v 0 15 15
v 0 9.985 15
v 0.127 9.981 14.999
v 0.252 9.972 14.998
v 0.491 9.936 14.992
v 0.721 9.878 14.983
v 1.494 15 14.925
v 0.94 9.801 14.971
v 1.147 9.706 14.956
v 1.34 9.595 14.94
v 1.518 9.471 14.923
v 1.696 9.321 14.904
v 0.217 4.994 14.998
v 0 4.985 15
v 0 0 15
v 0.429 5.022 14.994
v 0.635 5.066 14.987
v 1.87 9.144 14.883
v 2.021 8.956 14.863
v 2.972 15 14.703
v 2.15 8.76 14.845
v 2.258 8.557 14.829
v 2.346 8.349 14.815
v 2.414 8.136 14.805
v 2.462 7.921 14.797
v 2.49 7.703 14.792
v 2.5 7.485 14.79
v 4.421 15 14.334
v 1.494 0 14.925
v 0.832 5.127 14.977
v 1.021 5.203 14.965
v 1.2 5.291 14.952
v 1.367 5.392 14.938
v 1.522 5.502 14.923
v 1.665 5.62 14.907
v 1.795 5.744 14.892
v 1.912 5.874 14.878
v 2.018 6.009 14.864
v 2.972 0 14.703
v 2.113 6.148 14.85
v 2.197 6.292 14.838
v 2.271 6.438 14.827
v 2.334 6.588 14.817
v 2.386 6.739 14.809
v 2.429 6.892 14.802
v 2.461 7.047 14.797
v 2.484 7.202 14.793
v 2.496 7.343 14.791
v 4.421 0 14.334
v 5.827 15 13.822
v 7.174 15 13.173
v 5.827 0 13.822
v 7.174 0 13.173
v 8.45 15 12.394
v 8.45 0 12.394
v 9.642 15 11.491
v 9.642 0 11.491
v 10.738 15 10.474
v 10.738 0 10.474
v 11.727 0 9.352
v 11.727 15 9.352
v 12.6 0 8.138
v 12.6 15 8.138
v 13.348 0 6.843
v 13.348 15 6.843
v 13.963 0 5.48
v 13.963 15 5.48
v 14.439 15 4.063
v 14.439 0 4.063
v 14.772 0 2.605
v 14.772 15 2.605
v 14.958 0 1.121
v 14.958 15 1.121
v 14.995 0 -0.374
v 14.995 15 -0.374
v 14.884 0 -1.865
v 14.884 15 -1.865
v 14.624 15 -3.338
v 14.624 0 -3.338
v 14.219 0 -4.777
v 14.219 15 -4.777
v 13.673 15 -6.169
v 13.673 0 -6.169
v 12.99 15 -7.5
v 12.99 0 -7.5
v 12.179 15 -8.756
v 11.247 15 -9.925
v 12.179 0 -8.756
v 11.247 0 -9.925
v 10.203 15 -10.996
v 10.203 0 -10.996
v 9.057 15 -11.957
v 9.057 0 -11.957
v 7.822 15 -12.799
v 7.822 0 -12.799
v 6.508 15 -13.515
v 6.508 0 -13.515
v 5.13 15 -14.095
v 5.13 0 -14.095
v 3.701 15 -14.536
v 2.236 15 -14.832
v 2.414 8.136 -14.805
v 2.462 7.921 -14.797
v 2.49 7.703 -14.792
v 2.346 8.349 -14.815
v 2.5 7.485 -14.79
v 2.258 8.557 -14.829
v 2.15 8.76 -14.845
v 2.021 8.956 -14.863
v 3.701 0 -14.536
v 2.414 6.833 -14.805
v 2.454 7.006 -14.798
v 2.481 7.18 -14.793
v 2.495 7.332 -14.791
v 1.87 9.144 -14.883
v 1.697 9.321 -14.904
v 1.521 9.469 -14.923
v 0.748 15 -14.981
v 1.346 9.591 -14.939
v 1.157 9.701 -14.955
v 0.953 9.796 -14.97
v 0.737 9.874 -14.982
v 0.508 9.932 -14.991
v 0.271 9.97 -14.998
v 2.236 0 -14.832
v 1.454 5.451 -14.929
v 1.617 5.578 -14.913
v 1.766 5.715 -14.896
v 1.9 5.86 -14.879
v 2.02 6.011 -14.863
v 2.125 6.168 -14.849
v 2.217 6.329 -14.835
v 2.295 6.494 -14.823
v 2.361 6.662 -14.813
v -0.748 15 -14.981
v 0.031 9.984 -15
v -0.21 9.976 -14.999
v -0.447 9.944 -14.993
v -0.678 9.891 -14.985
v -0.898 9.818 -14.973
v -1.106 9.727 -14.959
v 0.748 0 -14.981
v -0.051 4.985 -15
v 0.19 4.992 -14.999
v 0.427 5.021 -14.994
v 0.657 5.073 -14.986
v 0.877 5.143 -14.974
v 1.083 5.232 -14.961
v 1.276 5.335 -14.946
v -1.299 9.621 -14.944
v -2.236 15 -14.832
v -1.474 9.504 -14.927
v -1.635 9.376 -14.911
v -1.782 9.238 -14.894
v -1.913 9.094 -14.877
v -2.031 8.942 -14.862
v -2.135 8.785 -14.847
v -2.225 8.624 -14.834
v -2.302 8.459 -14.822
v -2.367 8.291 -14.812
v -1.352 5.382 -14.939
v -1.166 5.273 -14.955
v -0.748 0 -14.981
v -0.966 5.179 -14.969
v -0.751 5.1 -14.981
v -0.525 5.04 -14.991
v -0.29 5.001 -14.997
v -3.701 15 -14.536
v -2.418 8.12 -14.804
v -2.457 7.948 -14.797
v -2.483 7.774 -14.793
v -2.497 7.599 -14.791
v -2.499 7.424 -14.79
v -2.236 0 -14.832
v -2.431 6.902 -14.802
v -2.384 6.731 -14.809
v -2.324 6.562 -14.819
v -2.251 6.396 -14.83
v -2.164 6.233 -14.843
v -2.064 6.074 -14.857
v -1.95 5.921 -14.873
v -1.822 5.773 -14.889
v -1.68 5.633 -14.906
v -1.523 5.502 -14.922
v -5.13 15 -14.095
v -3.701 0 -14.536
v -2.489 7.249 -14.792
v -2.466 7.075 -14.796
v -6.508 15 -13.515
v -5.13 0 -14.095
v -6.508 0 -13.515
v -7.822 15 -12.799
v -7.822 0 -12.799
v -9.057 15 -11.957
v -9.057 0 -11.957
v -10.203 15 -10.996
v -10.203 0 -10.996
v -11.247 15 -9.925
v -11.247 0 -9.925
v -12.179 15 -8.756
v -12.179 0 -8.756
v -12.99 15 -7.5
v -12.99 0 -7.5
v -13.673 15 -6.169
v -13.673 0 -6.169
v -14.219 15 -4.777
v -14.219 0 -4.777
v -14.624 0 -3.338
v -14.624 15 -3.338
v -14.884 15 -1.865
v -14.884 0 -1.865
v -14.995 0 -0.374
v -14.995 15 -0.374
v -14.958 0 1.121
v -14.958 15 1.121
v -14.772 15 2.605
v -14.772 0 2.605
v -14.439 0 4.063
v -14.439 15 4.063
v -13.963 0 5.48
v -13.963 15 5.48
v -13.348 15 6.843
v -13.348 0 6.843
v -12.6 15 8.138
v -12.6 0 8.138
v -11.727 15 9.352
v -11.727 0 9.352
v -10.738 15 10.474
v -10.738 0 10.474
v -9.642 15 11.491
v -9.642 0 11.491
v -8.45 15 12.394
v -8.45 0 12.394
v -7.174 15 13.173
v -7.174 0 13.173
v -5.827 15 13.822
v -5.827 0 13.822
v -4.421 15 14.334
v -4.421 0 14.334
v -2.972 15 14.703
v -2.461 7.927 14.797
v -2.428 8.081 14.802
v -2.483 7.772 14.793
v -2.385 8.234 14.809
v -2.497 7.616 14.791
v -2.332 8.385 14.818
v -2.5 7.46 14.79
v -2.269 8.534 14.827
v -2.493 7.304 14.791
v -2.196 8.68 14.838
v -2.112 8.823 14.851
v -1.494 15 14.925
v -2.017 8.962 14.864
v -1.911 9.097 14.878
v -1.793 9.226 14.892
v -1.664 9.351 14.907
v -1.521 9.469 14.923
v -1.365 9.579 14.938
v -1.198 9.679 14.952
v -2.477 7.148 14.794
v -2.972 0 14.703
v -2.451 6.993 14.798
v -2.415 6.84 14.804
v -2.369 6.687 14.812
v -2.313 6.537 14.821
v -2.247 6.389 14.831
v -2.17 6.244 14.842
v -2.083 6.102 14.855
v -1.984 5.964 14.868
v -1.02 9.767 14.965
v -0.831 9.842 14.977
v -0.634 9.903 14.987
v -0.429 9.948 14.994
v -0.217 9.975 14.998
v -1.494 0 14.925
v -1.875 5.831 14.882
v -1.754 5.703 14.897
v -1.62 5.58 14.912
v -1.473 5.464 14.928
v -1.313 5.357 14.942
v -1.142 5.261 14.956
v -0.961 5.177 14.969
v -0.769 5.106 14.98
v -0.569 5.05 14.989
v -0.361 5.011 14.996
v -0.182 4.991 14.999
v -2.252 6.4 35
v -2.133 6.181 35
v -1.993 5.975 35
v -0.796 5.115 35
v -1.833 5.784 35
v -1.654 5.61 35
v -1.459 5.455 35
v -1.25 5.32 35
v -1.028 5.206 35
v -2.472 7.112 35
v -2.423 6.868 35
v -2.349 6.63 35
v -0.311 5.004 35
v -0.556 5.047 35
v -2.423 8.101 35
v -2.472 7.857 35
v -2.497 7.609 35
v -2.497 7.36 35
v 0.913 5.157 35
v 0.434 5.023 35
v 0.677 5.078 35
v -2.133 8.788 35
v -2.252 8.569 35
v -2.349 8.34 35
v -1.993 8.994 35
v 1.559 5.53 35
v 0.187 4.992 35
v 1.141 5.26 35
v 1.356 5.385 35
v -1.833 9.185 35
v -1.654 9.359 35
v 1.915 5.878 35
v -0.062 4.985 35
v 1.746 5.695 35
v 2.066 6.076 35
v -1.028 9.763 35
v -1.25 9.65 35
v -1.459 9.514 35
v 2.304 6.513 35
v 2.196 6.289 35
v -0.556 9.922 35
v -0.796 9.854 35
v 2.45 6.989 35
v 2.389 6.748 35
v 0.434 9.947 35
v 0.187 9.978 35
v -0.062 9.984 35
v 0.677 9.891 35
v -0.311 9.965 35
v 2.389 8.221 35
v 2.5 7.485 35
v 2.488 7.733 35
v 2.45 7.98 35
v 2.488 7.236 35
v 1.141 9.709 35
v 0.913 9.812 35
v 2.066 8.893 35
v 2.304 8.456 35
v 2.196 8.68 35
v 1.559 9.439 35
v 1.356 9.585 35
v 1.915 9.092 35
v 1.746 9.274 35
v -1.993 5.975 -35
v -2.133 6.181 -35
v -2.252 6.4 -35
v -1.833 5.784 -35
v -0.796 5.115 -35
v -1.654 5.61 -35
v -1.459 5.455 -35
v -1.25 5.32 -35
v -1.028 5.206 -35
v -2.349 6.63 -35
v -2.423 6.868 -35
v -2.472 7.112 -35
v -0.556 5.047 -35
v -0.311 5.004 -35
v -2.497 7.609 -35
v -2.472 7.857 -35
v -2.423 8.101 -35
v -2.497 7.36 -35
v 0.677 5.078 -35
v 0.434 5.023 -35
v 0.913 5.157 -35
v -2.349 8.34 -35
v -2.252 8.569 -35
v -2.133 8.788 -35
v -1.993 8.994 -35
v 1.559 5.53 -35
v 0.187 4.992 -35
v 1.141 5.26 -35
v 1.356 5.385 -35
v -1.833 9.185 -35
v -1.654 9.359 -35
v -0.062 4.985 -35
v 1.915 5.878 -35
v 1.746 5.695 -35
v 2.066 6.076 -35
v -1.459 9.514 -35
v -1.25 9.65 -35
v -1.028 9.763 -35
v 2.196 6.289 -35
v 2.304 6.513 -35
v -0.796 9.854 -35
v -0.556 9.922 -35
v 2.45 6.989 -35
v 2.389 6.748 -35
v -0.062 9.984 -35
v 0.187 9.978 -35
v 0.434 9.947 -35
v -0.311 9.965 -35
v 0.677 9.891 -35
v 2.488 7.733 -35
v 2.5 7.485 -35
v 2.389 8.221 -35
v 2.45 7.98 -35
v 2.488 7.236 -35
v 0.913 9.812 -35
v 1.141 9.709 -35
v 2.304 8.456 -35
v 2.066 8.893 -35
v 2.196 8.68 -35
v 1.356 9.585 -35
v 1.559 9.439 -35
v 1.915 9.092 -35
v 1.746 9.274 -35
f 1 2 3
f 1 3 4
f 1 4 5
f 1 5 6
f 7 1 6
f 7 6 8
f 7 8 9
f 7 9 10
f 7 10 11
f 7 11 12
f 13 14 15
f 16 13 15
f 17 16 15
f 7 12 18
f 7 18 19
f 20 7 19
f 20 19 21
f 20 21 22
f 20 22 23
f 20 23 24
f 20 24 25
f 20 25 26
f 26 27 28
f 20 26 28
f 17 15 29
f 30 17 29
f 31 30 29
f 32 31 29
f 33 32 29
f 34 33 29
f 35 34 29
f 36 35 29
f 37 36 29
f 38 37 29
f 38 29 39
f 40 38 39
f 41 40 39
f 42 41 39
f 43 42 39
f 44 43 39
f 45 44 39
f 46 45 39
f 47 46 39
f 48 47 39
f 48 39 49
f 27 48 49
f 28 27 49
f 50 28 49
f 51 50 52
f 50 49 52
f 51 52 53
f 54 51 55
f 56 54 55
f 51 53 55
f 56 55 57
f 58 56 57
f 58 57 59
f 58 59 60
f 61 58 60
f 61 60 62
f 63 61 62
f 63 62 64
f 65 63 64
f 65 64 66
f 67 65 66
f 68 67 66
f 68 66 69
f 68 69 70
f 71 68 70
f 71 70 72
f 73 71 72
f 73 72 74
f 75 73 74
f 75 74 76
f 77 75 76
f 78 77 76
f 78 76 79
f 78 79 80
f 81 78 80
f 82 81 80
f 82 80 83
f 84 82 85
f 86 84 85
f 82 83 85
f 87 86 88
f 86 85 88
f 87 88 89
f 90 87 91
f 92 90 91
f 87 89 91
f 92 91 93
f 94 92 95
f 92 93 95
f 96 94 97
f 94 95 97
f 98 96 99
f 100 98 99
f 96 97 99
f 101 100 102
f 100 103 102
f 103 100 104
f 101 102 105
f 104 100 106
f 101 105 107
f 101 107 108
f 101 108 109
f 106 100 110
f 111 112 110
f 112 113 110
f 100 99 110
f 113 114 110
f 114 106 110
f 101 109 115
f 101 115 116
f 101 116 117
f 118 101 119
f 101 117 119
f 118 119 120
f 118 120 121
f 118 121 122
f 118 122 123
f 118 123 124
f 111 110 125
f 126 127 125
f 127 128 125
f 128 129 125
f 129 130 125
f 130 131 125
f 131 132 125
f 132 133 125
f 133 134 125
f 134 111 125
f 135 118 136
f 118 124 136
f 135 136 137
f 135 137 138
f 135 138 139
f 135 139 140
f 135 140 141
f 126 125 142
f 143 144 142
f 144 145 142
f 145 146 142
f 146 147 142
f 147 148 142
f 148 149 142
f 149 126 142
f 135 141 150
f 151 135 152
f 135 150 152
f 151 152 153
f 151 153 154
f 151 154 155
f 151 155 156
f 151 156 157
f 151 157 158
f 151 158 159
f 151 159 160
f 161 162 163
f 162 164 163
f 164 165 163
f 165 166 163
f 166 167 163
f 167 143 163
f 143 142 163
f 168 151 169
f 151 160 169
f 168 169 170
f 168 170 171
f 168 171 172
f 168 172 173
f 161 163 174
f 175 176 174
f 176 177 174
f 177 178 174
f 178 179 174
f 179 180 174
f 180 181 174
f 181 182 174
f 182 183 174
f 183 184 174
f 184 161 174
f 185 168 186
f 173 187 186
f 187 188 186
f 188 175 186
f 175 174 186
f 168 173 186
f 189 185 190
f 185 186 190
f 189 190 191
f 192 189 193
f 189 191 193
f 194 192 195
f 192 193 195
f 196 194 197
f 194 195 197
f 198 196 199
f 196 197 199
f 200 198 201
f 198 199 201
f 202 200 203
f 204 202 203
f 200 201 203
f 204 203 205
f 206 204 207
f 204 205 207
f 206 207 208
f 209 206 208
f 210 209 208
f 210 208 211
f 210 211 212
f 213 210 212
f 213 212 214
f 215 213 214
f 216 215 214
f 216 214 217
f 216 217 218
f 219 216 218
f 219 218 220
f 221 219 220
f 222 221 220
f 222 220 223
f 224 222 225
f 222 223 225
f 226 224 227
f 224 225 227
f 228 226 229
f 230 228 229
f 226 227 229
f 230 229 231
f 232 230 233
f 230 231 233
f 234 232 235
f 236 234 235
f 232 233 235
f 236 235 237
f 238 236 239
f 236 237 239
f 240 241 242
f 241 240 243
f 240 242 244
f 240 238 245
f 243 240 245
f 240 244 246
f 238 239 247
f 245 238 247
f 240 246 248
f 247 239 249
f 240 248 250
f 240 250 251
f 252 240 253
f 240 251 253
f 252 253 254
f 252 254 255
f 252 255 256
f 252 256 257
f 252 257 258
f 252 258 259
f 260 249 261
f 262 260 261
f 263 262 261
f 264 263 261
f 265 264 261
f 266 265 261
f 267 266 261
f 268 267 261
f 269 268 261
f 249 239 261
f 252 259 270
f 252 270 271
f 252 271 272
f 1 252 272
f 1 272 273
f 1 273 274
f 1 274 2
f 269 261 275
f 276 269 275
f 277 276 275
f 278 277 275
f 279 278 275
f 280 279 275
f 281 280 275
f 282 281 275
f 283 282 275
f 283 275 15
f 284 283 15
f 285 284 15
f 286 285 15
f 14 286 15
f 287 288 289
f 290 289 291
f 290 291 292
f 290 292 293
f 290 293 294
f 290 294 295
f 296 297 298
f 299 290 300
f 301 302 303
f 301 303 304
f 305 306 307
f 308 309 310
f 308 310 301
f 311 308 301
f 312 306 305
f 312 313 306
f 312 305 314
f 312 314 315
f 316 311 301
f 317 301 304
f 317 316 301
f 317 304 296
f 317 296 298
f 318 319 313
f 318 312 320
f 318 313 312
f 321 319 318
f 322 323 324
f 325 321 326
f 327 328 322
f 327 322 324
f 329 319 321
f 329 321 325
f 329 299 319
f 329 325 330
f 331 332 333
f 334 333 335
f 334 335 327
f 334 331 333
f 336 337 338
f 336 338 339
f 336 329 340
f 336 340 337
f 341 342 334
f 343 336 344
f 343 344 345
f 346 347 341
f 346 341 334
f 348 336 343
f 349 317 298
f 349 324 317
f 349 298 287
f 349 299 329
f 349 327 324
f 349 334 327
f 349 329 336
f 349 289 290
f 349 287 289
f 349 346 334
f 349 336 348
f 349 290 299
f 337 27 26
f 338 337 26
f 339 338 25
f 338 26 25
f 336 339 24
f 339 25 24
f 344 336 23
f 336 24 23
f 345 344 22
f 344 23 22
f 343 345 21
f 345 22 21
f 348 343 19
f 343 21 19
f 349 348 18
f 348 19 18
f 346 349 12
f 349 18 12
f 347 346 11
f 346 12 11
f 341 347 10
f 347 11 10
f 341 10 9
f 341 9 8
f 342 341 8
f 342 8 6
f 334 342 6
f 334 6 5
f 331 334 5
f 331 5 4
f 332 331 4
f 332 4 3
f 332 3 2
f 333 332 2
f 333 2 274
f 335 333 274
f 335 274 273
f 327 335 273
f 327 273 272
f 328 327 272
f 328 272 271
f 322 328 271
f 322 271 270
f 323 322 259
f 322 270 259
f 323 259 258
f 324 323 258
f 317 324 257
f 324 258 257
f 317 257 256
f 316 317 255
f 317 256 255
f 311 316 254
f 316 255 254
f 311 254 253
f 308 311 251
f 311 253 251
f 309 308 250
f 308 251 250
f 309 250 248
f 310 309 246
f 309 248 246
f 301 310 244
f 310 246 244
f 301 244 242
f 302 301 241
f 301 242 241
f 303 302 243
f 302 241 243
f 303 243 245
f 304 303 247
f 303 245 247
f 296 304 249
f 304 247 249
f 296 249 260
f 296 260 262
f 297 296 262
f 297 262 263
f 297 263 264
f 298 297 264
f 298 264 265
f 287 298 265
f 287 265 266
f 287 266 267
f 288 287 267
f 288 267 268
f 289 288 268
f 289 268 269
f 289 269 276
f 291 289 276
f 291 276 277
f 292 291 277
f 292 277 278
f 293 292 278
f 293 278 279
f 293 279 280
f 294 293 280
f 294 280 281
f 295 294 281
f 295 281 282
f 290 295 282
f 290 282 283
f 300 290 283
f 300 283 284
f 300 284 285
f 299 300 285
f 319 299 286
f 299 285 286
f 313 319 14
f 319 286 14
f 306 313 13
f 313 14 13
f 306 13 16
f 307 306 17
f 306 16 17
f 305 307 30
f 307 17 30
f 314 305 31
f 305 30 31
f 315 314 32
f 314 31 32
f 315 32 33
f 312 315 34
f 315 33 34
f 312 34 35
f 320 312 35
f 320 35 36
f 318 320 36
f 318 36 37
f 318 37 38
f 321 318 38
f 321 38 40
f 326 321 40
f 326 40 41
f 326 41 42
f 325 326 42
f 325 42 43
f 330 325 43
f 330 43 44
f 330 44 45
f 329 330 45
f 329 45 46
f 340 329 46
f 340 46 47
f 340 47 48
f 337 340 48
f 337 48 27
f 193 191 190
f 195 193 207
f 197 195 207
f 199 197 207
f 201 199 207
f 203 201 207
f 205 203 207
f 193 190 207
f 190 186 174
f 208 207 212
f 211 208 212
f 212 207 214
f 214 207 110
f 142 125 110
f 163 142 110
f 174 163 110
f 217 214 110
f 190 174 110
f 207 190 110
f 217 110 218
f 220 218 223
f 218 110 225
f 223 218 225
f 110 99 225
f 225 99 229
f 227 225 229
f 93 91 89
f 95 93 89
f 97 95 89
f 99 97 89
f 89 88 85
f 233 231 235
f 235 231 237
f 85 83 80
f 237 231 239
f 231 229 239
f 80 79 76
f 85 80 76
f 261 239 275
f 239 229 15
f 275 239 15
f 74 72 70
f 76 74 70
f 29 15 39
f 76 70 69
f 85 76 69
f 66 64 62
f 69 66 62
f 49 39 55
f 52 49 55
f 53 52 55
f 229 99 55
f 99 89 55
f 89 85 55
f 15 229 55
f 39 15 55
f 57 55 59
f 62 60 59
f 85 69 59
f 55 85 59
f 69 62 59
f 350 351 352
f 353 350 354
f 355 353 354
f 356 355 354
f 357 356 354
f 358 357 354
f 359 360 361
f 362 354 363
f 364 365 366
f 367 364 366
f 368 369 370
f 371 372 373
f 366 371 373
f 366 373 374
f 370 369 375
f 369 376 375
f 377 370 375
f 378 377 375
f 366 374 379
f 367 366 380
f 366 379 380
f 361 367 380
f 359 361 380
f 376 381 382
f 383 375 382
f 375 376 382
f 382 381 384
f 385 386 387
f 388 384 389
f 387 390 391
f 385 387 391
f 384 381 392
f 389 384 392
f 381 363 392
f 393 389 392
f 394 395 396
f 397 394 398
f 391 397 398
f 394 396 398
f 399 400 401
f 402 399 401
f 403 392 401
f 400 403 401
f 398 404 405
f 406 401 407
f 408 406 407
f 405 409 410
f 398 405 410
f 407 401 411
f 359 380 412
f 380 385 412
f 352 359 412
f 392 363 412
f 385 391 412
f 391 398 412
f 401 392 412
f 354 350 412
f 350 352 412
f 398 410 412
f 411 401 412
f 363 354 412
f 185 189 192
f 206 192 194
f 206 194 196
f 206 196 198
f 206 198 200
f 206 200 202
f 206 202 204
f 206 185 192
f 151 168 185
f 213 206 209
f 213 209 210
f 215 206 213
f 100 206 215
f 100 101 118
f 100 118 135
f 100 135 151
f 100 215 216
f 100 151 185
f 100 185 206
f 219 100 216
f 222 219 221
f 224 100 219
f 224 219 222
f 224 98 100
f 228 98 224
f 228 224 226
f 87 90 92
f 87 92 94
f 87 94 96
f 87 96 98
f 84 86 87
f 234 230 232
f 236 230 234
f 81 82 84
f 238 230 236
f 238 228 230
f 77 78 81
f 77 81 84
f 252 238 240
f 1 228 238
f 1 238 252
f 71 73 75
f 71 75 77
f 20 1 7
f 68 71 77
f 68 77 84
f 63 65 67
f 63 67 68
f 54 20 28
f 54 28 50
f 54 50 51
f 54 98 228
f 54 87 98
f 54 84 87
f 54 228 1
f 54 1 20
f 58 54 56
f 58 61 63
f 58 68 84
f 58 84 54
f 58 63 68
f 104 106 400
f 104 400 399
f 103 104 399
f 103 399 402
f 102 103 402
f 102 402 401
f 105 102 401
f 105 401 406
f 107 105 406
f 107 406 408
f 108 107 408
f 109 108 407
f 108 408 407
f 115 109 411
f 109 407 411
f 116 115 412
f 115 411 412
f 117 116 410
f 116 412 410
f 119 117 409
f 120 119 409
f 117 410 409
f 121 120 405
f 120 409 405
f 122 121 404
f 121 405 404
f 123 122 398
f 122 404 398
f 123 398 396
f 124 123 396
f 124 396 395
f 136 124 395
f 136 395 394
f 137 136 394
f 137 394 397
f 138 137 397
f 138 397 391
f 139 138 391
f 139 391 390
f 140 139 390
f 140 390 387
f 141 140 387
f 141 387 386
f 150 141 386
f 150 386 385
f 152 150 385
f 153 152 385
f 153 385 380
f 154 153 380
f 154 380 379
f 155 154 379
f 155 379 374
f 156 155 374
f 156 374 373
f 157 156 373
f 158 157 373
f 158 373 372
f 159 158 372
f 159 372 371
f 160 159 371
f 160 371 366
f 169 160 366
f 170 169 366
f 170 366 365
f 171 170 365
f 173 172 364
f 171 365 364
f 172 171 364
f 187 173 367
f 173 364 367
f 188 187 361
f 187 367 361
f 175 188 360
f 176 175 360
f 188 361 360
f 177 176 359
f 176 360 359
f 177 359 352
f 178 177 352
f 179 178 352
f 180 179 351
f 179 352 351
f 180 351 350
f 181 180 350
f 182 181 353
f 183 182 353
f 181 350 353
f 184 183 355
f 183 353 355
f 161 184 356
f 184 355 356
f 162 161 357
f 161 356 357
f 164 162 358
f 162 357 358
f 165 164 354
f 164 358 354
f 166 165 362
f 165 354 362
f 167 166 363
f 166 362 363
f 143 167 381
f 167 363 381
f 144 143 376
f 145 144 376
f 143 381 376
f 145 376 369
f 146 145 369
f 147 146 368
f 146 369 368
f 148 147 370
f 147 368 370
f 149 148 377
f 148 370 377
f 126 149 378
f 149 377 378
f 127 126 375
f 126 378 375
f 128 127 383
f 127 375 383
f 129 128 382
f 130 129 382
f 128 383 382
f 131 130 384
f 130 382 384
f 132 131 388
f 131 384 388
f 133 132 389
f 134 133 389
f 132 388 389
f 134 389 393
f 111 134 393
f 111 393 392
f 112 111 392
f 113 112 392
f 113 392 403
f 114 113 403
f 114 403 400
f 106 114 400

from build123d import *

# Parameters (mm, degrees)
SKETCH1_R                = 15
BOSS_EXTRUDE1_DEPTH      = 15
BOSS_EXTRUDE2_DEPTH      = 35
BOSS_EXTRUDE2_DEPTH_BACK = 35
SKETCH2_R                = 2.5


with BuildPart() as part:
    # Sketch1 → Boss-Extrude1 (new body)
    with BuildSketch(Plane(origin=(0, 0, 0), x_dir=(1, 0, 0), z_dir=(0, 1, 0))):
        Circle(SKETCH1_R)
    extrude(amount=BOSS_EXTRUDE1_DEPTH)

    # Sketch2 → Boss-Extrude2 (add, two sides: drawn at the far end of the back side and taken through both)
    with BuildSketch(Plane.XY.offset(-BOSS_EXTRUDE2_DEPTH_BACK)):
        with Locations((0, 7.484573098)):
            Circle(SKETCH2_R)
    extrude(amount=BOSS_EXTRUDE2_DEPTH + BOSS_EXTRUDE2_DEPTH_BACK)


solid = part.part
